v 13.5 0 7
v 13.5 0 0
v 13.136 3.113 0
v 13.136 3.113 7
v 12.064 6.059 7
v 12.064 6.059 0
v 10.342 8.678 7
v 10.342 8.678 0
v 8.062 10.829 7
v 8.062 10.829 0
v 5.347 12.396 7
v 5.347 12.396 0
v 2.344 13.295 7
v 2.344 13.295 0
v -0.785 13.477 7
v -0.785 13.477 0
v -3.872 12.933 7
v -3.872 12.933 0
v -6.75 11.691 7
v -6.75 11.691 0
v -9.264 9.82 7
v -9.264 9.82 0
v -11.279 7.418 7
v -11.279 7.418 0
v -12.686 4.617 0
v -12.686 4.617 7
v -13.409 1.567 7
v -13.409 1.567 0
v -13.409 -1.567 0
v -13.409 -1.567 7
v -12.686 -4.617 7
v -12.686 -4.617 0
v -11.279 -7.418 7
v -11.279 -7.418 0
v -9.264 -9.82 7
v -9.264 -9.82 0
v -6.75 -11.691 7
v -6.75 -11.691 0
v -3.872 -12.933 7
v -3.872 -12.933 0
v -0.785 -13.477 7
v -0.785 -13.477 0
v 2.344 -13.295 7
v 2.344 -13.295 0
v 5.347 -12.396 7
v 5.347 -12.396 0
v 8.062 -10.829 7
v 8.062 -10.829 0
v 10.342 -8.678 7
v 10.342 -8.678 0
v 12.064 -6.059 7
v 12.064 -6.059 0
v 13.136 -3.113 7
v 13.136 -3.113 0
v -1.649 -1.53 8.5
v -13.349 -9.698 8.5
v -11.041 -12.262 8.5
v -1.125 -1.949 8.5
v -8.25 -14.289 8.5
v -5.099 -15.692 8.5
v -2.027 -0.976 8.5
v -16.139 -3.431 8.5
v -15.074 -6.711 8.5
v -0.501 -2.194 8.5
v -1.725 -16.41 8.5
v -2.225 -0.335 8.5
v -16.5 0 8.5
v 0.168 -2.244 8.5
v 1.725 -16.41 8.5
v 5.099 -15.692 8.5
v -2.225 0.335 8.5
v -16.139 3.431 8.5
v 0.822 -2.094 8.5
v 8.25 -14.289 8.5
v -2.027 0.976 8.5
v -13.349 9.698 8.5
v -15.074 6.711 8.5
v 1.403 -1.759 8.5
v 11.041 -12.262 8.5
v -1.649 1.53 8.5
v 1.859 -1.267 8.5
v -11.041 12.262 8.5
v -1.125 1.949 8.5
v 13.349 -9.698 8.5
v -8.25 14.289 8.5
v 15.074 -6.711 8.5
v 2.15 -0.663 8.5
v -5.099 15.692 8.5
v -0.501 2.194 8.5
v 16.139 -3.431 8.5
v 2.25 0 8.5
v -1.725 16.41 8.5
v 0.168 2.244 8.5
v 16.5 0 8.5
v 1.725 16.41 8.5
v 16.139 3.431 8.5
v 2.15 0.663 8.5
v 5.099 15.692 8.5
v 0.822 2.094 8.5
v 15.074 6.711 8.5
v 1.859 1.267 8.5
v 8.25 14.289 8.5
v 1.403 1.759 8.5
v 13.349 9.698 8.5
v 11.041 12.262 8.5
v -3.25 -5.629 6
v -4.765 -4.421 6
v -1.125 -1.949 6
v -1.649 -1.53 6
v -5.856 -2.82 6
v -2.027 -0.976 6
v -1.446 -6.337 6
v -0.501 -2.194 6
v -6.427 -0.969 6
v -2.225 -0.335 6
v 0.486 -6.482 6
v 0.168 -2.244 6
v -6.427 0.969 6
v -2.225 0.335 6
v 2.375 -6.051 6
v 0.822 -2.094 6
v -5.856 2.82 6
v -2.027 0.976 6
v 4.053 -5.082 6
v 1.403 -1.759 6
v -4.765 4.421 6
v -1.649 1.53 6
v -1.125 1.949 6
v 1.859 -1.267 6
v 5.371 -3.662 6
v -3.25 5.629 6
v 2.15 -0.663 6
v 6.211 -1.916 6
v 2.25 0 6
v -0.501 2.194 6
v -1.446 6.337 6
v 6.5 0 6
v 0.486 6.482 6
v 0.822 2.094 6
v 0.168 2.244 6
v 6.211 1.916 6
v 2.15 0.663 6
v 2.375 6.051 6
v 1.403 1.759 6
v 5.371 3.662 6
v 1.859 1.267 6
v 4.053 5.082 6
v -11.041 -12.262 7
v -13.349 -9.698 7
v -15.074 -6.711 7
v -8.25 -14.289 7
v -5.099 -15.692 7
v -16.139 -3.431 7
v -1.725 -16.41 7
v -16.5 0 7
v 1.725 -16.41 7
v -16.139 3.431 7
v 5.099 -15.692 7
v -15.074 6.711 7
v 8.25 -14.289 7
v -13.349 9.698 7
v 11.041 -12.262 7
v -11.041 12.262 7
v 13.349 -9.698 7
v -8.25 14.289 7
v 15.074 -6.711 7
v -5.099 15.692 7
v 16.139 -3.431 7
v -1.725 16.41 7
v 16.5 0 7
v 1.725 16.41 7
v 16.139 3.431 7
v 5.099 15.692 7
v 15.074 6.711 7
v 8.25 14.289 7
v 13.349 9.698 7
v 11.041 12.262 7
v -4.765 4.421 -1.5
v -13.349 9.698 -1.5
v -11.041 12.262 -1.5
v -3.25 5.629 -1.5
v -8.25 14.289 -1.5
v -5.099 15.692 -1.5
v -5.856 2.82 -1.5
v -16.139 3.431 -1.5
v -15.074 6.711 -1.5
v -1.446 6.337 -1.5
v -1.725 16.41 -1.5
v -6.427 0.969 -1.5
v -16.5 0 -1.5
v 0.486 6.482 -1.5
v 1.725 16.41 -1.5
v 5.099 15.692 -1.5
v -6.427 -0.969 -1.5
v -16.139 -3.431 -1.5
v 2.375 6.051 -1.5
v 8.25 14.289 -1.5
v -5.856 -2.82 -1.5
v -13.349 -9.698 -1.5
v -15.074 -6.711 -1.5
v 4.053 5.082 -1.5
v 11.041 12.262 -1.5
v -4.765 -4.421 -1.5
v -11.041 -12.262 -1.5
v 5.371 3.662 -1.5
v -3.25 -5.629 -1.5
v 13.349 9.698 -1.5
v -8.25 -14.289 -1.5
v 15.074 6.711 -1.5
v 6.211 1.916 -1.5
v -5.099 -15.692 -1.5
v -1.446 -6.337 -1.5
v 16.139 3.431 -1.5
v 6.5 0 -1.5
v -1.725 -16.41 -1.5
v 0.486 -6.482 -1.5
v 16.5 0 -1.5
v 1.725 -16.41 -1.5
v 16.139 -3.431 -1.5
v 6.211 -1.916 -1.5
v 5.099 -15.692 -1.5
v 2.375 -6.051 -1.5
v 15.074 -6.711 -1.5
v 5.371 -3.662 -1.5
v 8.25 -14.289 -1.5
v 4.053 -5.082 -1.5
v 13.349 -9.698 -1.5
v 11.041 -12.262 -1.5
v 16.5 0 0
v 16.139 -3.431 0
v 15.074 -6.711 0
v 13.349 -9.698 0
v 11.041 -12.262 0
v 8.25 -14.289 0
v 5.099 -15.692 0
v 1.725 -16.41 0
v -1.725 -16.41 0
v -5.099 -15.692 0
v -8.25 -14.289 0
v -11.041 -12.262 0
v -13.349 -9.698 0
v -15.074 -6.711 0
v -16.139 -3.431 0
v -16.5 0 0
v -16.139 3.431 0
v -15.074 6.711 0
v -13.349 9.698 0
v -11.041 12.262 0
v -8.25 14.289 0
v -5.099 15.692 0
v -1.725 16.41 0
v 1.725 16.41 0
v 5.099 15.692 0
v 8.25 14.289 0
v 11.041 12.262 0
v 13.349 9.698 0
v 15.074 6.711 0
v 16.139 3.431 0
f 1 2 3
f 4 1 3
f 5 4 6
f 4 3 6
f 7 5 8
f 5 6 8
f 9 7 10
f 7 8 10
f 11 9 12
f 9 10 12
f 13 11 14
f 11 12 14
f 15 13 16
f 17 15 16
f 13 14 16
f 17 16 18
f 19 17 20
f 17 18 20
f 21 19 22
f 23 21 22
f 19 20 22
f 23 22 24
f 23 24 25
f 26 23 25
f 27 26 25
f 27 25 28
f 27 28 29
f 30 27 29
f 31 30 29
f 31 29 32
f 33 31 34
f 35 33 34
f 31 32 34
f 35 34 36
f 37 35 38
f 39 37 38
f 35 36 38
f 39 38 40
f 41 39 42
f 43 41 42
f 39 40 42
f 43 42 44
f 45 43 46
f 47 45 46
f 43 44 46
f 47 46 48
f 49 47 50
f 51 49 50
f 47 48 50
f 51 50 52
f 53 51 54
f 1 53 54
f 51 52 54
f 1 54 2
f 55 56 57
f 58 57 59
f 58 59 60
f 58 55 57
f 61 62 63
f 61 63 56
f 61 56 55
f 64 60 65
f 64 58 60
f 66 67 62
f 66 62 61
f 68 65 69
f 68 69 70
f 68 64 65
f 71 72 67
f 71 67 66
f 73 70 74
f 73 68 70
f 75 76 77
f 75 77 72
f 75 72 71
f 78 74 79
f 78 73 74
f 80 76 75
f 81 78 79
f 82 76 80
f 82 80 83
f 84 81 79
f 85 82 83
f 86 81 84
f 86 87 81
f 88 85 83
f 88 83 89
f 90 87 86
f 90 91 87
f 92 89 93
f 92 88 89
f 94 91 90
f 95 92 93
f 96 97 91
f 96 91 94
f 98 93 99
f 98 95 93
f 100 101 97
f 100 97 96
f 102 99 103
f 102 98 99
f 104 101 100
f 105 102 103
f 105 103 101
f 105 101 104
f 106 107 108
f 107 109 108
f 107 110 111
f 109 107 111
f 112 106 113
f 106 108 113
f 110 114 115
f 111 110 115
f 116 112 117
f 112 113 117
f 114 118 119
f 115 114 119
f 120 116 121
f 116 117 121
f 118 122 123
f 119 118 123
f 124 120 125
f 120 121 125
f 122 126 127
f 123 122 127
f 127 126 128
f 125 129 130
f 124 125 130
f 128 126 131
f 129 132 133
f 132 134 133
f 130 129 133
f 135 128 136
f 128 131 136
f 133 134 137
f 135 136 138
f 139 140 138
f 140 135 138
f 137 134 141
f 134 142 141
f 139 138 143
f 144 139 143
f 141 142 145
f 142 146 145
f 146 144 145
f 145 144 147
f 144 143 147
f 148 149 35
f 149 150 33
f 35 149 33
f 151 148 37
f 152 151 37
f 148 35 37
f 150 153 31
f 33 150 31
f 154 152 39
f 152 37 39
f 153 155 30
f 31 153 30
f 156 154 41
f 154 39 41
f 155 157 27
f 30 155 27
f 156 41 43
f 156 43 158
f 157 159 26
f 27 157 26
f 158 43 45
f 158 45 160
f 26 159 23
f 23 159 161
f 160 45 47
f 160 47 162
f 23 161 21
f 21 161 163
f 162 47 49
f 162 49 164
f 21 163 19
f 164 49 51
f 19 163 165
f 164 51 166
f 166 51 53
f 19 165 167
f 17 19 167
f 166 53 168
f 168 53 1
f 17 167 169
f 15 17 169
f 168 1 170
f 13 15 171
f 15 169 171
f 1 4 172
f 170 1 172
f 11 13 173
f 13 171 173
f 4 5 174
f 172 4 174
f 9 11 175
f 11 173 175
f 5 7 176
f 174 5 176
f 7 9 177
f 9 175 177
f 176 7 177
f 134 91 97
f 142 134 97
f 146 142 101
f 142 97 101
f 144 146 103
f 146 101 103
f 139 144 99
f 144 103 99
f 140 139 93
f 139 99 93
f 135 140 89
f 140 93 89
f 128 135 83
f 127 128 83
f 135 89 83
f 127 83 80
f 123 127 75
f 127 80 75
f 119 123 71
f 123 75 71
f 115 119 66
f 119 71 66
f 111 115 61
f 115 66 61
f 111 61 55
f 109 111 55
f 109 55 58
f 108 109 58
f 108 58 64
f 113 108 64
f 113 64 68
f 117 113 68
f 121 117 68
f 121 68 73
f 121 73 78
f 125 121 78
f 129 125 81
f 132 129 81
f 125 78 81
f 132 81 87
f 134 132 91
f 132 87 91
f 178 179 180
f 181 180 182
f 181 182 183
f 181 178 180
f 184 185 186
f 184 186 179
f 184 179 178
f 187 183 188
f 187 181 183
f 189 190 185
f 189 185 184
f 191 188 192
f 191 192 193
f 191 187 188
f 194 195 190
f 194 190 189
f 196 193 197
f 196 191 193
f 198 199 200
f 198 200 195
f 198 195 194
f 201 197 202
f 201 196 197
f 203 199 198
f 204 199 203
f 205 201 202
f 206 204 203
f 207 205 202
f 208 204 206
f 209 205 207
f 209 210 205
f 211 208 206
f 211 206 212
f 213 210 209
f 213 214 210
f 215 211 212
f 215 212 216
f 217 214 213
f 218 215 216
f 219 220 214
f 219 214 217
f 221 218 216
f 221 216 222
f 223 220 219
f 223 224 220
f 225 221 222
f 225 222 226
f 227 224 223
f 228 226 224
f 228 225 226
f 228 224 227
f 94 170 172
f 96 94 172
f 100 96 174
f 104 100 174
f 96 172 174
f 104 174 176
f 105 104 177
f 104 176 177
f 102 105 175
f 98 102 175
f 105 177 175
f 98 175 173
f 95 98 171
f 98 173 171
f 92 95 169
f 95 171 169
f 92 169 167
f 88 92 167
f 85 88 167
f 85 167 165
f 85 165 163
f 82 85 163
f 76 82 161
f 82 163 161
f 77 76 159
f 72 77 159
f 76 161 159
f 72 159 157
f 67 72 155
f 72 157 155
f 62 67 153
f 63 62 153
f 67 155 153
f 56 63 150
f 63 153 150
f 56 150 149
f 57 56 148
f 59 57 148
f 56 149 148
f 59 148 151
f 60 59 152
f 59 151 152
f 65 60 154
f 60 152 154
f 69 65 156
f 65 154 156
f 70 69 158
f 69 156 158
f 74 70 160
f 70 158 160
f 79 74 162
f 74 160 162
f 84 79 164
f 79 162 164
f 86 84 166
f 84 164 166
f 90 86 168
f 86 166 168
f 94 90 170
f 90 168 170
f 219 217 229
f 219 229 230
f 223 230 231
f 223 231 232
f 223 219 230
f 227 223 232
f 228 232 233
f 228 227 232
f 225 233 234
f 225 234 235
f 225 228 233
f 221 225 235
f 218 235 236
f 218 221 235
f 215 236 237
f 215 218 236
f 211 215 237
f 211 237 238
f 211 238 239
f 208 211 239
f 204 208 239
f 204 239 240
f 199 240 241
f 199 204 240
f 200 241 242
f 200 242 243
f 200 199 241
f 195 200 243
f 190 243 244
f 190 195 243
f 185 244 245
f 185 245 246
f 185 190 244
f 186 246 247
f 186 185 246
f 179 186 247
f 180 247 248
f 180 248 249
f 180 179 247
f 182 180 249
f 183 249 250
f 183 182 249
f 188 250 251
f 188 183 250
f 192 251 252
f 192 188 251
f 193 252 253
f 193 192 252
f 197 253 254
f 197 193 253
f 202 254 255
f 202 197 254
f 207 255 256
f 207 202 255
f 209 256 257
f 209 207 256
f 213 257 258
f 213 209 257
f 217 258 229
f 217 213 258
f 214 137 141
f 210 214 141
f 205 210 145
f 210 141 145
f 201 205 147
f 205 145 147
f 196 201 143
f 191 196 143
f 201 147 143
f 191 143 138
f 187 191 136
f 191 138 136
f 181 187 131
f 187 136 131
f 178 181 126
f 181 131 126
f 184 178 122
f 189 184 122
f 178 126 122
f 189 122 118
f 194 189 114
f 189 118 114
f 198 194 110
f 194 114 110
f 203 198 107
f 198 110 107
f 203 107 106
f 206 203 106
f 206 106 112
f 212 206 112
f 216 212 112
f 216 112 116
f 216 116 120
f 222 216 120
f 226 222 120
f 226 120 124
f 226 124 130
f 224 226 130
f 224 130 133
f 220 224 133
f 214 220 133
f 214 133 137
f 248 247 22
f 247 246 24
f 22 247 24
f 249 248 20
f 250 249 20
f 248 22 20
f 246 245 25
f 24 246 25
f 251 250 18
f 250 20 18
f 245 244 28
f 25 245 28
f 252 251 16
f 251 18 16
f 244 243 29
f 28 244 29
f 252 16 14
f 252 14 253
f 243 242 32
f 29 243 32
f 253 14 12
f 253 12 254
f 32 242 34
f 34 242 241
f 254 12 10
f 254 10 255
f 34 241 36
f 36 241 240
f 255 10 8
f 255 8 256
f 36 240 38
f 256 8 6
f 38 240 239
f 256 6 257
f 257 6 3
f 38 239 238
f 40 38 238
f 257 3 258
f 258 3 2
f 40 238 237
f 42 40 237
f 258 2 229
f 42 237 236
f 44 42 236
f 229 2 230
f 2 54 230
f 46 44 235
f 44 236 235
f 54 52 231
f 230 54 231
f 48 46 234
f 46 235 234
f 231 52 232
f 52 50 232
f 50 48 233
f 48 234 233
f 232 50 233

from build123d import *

# Parameters (mm, degrees)
SKETCH1_R           = 13.5
BOSS_EXTRUDE1_DEPTH = 7
SKETCH2_R           = 16.5
BOSS_EXTRUDE2_DEPTH = 1.5
BOSS_EXTRUDE3_START = 1.5
SKETCH3_R           = 16.5
BOSS_EXTRUDE3_DEPTH = 1.5
SKETCH4_R           = 6.5
CUT_EXTRUDE1_DEPTH  = 26.38700455
SKETCH5_R           = 6.5
SKETCH5_R_2         = 2.25
BOSS_EXTRUDE4_DEPTH = 2.5


with BuildPart() as part:
    # Sketch1 → Boss-Extrude1 (new body)
    with BuildSketch(Plane.XY):
        Circle(SKETCH1_R)
    extrude(amount=BOSS_EXTRUDE1_DEPTH)

    # Sketch2 → Boss-Extrude2 (add)
    with BuildSketch(Plane.XY.offset(7)):
        Circle(SKETCH2_R)
    extrude(amount=BOSS_EXTRUDE2_DEPTH)

    # Sketch3 → Boss-Extrude3 (add)
    with BuildSketch(Plane(origin=(0, 0, 0), x_dir=(-1, 0, 0), z_dir=(0, 0, -1)).offset(BOSS_EXTRUDE3_START)):
        with Locations(Location((0, 0, 0), (0, 0, 180))):
            Circle(SKETCH3_R)
    extrude(amount=-BOSS_EXTRUDE3_DEPTH)

    # Sketch4 → Cut-Extrude1 (cut, through all)
    with BuildSketch(Plane.XY.offset(8.5)):
        Circle(SKETCH4_R)
    extrude(amount=-CUT_EXTRUDE1_DEPTH, mode=Mode.SUBTRACT)

    # Sketch5 → Boss-Extrude4 (add)
    with BuildSketch(Plane.XY.offset(8.5)):
        Circle(SKETCH5_R)
        Circle(SKETCH5_R_2, mode=Mode.SUBTRACT)
    extrude(amount=-BOSS_EXTRUDE4_DEPTH)


solid = part.part
